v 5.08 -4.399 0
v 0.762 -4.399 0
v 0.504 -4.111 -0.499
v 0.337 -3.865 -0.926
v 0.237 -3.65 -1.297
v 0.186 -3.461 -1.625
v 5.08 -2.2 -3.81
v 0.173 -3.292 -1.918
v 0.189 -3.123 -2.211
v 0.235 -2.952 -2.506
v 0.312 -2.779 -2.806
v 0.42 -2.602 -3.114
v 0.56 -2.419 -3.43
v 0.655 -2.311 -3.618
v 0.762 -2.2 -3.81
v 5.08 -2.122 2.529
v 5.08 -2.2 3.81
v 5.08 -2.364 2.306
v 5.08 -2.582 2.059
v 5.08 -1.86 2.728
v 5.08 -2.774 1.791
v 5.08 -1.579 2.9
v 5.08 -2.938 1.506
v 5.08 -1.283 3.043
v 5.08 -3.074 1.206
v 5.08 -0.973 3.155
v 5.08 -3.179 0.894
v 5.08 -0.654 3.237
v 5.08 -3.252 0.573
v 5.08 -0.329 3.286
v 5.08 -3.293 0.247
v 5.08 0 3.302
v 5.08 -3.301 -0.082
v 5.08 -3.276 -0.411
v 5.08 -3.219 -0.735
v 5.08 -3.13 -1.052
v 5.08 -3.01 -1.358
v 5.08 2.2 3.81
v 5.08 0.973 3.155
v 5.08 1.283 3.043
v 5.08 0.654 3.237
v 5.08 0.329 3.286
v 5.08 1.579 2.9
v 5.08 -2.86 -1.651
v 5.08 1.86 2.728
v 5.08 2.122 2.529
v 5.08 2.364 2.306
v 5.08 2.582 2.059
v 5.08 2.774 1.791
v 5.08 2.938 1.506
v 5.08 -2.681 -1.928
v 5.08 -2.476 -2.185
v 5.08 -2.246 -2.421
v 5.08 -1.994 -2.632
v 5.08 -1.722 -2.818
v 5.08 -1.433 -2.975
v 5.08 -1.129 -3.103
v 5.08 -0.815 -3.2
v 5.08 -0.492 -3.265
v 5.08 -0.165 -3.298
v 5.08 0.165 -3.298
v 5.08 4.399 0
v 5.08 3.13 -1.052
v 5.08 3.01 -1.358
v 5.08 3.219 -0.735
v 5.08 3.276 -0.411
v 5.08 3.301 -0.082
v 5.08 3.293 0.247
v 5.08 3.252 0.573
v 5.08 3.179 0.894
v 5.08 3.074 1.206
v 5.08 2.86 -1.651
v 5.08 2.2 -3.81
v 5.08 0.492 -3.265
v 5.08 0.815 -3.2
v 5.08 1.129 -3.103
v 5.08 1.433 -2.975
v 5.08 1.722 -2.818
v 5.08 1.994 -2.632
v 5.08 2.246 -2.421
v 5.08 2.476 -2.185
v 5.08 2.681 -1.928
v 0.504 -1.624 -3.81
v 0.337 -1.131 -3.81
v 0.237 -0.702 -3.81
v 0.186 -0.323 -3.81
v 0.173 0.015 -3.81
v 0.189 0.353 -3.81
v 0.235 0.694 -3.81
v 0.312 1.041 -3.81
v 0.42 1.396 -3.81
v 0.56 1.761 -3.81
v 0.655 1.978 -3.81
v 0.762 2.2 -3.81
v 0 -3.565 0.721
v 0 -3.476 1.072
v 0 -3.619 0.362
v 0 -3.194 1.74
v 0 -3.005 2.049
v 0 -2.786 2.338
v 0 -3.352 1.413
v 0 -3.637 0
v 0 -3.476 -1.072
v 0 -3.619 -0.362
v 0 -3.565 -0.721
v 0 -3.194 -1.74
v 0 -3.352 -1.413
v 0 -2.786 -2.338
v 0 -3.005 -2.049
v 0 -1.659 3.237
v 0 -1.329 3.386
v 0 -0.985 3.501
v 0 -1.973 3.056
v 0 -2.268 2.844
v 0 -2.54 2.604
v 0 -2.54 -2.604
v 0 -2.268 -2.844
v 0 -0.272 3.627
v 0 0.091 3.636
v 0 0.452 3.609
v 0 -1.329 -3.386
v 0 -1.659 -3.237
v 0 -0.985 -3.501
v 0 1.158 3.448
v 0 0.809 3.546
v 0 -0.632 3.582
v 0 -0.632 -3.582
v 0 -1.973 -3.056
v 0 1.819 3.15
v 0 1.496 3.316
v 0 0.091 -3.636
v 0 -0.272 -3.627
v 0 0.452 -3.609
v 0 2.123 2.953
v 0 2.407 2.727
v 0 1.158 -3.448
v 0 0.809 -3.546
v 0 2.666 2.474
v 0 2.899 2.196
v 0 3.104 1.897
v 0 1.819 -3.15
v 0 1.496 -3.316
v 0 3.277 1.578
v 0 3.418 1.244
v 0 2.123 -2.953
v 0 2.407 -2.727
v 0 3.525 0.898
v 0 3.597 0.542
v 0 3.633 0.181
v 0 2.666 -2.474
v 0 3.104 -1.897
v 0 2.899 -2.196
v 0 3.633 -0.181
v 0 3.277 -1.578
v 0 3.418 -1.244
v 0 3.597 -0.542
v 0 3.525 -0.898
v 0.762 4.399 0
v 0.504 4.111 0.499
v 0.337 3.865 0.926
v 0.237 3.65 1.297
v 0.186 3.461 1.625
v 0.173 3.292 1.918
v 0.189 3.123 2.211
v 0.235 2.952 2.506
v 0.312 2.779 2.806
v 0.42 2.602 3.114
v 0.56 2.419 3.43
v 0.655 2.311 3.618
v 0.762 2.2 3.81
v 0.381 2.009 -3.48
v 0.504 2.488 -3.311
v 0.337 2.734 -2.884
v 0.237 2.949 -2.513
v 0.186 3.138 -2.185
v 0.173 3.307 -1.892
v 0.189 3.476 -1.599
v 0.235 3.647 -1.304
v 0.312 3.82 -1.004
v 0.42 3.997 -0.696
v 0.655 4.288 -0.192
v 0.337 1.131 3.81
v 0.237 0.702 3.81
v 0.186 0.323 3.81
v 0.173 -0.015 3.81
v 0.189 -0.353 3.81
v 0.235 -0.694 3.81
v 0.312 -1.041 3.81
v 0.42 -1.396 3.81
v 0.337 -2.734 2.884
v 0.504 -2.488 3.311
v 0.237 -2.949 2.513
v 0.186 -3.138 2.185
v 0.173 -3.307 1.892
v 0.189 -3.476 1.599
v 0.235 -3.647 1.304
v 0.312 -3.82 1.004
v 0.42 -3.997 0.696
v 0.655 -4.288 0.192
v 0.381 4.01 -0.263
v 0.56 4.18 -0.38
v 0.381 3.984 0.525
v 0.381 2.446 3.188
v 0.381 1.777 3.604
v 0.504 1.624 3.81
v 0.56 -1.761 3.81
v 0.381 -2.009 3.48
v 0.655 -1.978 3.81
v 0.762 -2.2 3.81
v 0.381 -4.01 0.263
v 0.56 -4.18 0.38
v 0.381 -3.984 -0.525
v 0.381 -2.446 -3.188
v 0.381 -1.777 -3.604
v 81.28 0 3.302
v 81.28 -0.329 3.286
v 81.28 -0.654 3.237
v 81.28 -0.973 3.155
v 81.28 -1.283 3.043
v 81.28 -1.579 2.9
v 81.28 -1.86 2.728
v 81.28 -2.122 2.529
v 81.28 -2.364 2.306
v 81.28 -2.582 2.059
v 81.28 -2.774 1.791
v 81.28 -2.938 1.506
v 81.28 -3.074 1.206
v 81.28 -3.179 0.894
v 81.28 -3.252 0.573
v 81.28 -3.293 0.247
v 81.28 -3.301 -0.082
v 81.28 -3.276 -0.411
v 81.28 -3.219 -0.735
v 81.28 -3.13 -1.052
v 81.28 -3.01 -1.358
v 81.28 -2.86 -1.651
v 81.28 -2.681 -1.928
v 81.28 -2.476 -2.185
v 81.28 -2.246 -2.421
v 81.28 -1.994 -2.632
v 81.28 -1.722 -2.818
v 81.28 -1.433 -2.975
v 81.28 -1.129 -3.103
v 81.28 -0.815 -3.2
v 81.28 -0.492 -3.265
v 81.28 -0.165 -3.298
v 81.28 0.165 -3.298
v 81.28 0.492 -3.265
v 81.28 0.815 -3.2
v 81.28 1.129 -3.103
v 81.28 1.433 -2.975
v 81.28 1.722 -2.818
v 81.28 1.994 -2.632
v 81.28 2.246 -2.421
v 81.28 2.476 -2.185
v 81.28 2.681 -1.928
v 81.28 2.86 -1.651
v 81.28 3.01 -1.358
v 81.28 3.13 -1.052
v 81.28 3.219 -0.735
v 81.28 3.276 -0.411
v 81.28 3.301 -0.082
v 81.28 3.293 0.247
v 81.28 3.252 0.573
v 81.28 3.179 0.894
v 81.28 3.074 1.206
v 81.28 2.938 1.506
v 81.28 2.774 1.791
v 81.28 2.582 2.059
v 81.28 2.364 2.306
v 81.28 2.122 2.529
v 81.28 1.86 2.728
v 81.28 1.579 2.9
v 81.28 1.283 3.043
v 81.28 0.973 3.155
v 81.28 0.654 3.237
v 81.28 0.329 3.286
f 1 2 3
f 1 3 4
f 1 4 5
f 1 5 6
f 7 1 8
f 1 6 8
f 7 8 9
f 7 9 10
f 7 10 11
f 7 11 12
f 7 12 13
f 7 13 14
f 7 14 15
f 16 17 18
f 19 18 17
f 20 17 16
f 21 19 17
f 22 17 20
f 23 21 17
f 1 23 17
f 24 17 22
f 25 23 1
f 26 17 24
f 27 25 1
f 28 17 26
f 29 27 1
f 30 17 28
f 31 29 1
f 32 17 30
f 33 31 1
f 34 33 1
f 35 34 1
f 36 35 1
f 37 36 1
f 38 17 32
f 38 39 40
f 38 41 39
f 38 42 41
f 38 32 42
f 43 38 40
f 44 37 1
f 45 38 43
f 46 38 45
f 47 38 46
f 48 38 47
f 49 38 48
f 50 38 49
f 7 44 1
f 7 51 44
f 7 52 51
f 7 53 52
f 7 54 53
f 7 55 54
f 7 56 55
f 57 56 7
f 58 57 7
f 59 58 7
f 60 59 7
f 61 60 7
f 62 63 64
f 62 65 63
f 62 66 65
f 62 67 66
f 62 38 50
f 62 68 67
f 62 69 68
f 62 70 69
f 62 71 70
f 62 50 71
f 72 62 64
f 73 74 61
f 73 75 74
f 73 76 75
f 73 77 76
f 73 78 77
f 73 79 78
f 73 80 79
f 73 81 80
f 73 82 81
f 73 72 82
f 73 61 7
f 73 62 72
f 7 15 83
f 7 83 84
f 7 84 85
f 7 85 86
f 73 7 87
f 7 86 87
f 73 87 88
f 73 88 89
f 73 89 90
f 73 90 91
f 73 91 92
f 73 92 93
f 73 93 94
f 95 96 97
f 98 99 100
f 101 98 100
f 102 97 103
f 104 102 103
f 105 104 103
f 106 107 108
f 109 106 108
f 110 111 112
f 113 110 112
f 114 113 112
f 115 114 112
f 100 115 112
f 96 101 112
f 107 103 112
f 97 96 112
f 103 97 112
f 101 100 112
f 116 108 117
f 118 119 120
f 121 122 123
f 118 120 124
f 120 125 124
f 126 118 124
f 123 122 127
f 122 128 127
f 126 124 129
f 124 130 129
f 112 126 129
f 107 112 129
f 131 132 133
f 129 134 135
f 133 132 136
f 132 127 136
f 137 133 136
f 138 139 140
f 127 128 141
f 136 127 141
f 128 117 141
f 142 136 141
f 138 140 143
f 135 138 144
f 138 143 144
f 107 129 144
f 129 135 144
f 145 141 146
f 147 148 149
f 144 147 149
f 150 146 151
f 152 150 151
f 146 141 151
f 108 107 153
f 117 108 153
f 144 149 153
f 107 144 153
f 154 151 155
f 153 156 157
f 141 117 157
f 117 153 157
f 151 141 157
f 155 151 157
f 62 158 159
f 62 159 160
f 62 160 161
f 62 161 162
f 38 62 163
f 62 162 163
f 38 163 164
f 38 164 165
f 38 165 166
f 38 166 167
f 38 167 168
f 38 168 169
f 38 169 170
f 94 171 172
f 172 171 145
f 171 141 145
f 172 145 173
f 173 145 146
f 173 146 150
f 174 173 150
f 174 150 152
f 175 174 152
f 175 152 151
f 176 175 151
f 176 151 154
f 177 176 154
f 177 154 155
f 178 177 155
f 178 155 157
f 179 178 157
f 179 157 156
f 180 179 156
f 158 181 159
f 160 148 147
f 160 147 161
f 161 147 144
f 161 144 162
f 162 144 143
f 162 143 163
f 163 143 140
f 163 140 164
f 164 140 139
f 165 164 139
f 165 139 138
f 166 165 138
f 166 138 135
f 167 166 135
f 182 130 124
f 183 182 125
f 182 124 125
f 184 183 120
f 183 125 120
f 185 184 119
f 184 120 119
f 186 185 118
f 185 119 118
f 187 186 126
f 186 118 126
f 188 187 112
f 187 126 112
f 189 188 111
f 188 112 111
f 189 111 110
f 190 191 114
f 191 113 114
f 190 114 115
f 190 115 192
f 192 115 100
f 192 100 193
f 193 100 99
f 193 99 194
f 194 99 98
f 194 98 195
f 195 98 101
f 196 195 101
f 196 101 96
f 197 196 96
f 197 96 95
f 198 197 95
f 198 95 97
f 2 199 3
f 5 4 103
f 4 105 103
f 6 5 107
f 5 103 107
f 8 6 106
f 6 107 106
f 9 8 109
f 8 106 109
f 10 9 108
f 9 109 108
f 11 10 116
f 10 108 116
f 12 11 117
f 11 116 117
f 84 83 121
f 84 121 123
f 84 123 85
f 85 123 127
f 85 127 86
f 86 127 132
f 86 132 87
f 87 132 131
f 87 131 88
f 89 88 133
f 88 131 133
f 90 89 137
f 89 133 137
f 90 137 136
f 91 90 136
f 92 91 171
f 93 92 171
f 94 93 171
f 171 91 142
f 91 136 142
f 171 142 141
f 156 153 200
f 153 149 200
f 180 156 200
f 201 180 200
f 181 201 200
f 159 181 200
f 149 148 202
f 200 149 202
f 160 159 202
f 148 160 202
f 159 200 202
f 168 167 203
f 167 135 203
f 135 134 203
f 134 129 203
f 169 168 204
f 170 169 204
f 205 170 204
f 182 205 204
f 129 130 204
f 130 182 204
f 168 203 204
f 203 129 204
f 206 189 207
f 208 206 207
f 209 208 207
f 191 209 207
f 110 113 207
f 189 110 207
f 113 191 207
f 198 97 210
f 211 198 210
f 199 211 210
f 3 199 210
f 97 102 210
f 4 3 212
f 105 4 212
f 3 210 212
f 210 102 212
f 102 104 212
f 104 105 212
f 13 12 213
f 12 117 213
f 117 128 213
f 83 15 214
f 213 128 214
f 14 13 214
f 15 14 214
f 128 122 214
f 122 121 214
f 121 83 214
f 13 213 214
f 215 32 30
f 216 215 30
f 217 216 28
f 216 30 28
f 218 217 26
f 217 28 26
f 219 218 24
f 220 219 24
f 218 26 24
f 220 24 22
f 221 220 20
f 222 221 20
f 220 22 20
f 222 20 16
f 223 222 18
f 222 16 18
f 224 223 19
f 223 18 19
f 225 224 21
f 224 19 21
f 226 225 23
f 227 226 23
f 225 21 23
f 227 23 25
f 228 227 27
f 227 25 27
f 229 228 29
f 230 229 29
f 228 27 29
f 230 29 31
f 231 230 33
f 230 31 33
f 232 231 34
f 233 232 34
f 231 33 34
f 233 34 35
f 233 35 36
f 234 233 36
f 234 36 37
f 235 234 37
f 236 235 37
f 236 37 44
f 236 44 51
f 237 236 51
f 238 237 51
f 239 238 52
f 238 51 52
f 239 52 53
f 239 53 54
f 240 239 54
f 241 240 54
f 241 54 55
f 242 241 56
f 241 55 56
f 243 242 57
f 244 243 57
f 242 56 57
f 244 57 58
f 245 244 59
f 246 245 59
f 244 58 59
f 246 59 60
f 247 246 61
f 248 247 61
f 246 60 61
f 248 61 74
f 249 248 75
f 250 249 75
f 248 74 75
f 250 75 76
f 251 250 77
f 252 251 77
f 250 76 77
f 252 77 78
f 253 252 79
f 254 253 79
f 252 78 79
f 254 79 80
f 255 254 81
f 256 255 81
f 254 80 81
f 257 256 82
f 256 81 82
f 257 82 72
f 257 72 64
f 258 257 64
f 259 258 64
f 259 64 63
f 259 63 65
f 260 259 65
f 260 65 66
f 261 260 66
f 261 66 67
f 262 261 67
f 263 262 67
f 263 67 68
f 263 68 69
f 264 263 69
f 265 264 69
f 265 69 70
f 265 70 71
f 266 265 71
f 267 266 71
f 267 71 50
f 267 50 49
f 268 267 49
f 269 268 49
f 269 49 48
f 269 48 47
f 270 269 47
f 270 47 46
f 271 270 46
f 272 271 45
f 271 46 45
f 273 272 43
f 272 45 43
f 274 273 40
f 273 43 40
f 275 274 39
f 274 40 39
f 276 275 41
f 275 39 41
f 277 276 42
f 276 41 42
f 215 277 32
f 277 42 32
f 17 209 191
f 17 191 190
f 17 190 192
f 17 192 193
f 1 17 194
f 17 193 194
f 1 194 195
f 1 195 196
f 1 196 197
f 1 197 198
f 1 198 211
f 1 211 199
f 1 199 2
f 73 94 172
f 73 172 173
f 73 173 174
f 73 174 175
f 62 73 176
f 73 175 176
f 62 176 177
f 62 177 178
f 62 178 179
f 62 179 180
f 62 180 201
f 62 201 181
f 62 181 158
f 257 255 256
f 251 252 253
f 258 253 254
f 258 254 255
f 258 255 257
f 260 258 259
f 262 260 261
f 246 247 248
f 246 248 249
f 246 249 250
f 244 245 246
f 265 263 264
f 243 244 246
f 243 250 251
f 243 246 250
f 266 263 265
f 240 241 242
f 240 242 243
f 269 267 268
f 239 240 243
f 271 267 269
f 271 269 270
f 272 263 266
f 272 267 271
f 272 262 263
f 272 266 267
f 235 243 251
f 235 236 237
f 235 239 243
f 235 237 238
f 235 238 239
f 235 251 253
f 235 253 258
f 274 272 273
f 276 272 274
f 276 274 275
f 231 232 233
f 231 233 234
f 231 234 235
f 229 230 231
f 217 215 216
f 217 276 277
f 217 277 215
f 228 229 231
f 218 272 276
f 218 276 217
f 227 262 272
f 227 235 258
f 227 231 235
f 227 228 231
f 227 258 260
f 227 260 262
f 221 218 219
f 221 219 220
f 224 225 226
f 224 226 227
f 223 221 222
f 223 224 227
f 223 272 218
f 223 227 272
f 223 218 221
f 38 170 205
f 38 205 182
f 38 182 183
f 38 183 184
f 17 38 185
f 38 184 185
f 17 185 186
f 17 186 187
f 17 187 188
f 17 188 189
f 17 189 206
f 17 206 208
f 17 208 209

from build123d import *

# Parameters (mm, degrees)
BOSS_EXTRUDE1_DEPTH = 5.08
SKETCH3_R           = 3.302
BOSS_EXTRUDE2_DEPTH = 76.2


with BuildPart() as part:
    # Sketch2 → Boss-Extrude1 (new body)
    with BuildSketch(Plane(origin=(0, 0, 0), x_dir=(0, 0, -1), z_dir=(1, 0, 0))):
        Polygon((0, -4.399409051), (3.81, -2.199704526), (3.81, 2.199704526), (0, 4.399409051), (-3.81, 2.199704526), (-3.81, -2.199704526), align=None)
    extrude(amount=BOSS_EXTRUDE1_DEPTH)

    # Sketch3 → Boss-Extrude2 (add)
    with BuildSketch(Plane(origin=(5.08, 0, 0), x_dir=(0, 0, -1), z_dir=(1, 0, 0))):
        with Locations(Location((0, 0, 0), (0, 0, 180))):
            Circle(SKETCH3_R)
    extrude(amount=BOSS_EXTRUDE2_DEPTH)

    # Sketch4 → Cut-Revolve1 (revolve, cut)
    with BuildSketch(Plane.XY, mode=Mode.PRIVATE) as cut_revolve1_sk:
        Polygon((5.08, 4.399409051), (0.762, 4.399409051), (0, 3.637409051), (0, 2.199704526), (-1.146784512, 2.199704526), (-1.146784512, 5.580945805), (5.08, 5.580945805), align=None)
    revolve(cut_revolve1_sk.sketch.rotate(Axis((0, 0, 0), (1, 0, 0)), 300.000000093), axis=Axis((0, 0, 0), (1, 0, 0)), mode=Mode.SUBTRACT)


solid = part.part
